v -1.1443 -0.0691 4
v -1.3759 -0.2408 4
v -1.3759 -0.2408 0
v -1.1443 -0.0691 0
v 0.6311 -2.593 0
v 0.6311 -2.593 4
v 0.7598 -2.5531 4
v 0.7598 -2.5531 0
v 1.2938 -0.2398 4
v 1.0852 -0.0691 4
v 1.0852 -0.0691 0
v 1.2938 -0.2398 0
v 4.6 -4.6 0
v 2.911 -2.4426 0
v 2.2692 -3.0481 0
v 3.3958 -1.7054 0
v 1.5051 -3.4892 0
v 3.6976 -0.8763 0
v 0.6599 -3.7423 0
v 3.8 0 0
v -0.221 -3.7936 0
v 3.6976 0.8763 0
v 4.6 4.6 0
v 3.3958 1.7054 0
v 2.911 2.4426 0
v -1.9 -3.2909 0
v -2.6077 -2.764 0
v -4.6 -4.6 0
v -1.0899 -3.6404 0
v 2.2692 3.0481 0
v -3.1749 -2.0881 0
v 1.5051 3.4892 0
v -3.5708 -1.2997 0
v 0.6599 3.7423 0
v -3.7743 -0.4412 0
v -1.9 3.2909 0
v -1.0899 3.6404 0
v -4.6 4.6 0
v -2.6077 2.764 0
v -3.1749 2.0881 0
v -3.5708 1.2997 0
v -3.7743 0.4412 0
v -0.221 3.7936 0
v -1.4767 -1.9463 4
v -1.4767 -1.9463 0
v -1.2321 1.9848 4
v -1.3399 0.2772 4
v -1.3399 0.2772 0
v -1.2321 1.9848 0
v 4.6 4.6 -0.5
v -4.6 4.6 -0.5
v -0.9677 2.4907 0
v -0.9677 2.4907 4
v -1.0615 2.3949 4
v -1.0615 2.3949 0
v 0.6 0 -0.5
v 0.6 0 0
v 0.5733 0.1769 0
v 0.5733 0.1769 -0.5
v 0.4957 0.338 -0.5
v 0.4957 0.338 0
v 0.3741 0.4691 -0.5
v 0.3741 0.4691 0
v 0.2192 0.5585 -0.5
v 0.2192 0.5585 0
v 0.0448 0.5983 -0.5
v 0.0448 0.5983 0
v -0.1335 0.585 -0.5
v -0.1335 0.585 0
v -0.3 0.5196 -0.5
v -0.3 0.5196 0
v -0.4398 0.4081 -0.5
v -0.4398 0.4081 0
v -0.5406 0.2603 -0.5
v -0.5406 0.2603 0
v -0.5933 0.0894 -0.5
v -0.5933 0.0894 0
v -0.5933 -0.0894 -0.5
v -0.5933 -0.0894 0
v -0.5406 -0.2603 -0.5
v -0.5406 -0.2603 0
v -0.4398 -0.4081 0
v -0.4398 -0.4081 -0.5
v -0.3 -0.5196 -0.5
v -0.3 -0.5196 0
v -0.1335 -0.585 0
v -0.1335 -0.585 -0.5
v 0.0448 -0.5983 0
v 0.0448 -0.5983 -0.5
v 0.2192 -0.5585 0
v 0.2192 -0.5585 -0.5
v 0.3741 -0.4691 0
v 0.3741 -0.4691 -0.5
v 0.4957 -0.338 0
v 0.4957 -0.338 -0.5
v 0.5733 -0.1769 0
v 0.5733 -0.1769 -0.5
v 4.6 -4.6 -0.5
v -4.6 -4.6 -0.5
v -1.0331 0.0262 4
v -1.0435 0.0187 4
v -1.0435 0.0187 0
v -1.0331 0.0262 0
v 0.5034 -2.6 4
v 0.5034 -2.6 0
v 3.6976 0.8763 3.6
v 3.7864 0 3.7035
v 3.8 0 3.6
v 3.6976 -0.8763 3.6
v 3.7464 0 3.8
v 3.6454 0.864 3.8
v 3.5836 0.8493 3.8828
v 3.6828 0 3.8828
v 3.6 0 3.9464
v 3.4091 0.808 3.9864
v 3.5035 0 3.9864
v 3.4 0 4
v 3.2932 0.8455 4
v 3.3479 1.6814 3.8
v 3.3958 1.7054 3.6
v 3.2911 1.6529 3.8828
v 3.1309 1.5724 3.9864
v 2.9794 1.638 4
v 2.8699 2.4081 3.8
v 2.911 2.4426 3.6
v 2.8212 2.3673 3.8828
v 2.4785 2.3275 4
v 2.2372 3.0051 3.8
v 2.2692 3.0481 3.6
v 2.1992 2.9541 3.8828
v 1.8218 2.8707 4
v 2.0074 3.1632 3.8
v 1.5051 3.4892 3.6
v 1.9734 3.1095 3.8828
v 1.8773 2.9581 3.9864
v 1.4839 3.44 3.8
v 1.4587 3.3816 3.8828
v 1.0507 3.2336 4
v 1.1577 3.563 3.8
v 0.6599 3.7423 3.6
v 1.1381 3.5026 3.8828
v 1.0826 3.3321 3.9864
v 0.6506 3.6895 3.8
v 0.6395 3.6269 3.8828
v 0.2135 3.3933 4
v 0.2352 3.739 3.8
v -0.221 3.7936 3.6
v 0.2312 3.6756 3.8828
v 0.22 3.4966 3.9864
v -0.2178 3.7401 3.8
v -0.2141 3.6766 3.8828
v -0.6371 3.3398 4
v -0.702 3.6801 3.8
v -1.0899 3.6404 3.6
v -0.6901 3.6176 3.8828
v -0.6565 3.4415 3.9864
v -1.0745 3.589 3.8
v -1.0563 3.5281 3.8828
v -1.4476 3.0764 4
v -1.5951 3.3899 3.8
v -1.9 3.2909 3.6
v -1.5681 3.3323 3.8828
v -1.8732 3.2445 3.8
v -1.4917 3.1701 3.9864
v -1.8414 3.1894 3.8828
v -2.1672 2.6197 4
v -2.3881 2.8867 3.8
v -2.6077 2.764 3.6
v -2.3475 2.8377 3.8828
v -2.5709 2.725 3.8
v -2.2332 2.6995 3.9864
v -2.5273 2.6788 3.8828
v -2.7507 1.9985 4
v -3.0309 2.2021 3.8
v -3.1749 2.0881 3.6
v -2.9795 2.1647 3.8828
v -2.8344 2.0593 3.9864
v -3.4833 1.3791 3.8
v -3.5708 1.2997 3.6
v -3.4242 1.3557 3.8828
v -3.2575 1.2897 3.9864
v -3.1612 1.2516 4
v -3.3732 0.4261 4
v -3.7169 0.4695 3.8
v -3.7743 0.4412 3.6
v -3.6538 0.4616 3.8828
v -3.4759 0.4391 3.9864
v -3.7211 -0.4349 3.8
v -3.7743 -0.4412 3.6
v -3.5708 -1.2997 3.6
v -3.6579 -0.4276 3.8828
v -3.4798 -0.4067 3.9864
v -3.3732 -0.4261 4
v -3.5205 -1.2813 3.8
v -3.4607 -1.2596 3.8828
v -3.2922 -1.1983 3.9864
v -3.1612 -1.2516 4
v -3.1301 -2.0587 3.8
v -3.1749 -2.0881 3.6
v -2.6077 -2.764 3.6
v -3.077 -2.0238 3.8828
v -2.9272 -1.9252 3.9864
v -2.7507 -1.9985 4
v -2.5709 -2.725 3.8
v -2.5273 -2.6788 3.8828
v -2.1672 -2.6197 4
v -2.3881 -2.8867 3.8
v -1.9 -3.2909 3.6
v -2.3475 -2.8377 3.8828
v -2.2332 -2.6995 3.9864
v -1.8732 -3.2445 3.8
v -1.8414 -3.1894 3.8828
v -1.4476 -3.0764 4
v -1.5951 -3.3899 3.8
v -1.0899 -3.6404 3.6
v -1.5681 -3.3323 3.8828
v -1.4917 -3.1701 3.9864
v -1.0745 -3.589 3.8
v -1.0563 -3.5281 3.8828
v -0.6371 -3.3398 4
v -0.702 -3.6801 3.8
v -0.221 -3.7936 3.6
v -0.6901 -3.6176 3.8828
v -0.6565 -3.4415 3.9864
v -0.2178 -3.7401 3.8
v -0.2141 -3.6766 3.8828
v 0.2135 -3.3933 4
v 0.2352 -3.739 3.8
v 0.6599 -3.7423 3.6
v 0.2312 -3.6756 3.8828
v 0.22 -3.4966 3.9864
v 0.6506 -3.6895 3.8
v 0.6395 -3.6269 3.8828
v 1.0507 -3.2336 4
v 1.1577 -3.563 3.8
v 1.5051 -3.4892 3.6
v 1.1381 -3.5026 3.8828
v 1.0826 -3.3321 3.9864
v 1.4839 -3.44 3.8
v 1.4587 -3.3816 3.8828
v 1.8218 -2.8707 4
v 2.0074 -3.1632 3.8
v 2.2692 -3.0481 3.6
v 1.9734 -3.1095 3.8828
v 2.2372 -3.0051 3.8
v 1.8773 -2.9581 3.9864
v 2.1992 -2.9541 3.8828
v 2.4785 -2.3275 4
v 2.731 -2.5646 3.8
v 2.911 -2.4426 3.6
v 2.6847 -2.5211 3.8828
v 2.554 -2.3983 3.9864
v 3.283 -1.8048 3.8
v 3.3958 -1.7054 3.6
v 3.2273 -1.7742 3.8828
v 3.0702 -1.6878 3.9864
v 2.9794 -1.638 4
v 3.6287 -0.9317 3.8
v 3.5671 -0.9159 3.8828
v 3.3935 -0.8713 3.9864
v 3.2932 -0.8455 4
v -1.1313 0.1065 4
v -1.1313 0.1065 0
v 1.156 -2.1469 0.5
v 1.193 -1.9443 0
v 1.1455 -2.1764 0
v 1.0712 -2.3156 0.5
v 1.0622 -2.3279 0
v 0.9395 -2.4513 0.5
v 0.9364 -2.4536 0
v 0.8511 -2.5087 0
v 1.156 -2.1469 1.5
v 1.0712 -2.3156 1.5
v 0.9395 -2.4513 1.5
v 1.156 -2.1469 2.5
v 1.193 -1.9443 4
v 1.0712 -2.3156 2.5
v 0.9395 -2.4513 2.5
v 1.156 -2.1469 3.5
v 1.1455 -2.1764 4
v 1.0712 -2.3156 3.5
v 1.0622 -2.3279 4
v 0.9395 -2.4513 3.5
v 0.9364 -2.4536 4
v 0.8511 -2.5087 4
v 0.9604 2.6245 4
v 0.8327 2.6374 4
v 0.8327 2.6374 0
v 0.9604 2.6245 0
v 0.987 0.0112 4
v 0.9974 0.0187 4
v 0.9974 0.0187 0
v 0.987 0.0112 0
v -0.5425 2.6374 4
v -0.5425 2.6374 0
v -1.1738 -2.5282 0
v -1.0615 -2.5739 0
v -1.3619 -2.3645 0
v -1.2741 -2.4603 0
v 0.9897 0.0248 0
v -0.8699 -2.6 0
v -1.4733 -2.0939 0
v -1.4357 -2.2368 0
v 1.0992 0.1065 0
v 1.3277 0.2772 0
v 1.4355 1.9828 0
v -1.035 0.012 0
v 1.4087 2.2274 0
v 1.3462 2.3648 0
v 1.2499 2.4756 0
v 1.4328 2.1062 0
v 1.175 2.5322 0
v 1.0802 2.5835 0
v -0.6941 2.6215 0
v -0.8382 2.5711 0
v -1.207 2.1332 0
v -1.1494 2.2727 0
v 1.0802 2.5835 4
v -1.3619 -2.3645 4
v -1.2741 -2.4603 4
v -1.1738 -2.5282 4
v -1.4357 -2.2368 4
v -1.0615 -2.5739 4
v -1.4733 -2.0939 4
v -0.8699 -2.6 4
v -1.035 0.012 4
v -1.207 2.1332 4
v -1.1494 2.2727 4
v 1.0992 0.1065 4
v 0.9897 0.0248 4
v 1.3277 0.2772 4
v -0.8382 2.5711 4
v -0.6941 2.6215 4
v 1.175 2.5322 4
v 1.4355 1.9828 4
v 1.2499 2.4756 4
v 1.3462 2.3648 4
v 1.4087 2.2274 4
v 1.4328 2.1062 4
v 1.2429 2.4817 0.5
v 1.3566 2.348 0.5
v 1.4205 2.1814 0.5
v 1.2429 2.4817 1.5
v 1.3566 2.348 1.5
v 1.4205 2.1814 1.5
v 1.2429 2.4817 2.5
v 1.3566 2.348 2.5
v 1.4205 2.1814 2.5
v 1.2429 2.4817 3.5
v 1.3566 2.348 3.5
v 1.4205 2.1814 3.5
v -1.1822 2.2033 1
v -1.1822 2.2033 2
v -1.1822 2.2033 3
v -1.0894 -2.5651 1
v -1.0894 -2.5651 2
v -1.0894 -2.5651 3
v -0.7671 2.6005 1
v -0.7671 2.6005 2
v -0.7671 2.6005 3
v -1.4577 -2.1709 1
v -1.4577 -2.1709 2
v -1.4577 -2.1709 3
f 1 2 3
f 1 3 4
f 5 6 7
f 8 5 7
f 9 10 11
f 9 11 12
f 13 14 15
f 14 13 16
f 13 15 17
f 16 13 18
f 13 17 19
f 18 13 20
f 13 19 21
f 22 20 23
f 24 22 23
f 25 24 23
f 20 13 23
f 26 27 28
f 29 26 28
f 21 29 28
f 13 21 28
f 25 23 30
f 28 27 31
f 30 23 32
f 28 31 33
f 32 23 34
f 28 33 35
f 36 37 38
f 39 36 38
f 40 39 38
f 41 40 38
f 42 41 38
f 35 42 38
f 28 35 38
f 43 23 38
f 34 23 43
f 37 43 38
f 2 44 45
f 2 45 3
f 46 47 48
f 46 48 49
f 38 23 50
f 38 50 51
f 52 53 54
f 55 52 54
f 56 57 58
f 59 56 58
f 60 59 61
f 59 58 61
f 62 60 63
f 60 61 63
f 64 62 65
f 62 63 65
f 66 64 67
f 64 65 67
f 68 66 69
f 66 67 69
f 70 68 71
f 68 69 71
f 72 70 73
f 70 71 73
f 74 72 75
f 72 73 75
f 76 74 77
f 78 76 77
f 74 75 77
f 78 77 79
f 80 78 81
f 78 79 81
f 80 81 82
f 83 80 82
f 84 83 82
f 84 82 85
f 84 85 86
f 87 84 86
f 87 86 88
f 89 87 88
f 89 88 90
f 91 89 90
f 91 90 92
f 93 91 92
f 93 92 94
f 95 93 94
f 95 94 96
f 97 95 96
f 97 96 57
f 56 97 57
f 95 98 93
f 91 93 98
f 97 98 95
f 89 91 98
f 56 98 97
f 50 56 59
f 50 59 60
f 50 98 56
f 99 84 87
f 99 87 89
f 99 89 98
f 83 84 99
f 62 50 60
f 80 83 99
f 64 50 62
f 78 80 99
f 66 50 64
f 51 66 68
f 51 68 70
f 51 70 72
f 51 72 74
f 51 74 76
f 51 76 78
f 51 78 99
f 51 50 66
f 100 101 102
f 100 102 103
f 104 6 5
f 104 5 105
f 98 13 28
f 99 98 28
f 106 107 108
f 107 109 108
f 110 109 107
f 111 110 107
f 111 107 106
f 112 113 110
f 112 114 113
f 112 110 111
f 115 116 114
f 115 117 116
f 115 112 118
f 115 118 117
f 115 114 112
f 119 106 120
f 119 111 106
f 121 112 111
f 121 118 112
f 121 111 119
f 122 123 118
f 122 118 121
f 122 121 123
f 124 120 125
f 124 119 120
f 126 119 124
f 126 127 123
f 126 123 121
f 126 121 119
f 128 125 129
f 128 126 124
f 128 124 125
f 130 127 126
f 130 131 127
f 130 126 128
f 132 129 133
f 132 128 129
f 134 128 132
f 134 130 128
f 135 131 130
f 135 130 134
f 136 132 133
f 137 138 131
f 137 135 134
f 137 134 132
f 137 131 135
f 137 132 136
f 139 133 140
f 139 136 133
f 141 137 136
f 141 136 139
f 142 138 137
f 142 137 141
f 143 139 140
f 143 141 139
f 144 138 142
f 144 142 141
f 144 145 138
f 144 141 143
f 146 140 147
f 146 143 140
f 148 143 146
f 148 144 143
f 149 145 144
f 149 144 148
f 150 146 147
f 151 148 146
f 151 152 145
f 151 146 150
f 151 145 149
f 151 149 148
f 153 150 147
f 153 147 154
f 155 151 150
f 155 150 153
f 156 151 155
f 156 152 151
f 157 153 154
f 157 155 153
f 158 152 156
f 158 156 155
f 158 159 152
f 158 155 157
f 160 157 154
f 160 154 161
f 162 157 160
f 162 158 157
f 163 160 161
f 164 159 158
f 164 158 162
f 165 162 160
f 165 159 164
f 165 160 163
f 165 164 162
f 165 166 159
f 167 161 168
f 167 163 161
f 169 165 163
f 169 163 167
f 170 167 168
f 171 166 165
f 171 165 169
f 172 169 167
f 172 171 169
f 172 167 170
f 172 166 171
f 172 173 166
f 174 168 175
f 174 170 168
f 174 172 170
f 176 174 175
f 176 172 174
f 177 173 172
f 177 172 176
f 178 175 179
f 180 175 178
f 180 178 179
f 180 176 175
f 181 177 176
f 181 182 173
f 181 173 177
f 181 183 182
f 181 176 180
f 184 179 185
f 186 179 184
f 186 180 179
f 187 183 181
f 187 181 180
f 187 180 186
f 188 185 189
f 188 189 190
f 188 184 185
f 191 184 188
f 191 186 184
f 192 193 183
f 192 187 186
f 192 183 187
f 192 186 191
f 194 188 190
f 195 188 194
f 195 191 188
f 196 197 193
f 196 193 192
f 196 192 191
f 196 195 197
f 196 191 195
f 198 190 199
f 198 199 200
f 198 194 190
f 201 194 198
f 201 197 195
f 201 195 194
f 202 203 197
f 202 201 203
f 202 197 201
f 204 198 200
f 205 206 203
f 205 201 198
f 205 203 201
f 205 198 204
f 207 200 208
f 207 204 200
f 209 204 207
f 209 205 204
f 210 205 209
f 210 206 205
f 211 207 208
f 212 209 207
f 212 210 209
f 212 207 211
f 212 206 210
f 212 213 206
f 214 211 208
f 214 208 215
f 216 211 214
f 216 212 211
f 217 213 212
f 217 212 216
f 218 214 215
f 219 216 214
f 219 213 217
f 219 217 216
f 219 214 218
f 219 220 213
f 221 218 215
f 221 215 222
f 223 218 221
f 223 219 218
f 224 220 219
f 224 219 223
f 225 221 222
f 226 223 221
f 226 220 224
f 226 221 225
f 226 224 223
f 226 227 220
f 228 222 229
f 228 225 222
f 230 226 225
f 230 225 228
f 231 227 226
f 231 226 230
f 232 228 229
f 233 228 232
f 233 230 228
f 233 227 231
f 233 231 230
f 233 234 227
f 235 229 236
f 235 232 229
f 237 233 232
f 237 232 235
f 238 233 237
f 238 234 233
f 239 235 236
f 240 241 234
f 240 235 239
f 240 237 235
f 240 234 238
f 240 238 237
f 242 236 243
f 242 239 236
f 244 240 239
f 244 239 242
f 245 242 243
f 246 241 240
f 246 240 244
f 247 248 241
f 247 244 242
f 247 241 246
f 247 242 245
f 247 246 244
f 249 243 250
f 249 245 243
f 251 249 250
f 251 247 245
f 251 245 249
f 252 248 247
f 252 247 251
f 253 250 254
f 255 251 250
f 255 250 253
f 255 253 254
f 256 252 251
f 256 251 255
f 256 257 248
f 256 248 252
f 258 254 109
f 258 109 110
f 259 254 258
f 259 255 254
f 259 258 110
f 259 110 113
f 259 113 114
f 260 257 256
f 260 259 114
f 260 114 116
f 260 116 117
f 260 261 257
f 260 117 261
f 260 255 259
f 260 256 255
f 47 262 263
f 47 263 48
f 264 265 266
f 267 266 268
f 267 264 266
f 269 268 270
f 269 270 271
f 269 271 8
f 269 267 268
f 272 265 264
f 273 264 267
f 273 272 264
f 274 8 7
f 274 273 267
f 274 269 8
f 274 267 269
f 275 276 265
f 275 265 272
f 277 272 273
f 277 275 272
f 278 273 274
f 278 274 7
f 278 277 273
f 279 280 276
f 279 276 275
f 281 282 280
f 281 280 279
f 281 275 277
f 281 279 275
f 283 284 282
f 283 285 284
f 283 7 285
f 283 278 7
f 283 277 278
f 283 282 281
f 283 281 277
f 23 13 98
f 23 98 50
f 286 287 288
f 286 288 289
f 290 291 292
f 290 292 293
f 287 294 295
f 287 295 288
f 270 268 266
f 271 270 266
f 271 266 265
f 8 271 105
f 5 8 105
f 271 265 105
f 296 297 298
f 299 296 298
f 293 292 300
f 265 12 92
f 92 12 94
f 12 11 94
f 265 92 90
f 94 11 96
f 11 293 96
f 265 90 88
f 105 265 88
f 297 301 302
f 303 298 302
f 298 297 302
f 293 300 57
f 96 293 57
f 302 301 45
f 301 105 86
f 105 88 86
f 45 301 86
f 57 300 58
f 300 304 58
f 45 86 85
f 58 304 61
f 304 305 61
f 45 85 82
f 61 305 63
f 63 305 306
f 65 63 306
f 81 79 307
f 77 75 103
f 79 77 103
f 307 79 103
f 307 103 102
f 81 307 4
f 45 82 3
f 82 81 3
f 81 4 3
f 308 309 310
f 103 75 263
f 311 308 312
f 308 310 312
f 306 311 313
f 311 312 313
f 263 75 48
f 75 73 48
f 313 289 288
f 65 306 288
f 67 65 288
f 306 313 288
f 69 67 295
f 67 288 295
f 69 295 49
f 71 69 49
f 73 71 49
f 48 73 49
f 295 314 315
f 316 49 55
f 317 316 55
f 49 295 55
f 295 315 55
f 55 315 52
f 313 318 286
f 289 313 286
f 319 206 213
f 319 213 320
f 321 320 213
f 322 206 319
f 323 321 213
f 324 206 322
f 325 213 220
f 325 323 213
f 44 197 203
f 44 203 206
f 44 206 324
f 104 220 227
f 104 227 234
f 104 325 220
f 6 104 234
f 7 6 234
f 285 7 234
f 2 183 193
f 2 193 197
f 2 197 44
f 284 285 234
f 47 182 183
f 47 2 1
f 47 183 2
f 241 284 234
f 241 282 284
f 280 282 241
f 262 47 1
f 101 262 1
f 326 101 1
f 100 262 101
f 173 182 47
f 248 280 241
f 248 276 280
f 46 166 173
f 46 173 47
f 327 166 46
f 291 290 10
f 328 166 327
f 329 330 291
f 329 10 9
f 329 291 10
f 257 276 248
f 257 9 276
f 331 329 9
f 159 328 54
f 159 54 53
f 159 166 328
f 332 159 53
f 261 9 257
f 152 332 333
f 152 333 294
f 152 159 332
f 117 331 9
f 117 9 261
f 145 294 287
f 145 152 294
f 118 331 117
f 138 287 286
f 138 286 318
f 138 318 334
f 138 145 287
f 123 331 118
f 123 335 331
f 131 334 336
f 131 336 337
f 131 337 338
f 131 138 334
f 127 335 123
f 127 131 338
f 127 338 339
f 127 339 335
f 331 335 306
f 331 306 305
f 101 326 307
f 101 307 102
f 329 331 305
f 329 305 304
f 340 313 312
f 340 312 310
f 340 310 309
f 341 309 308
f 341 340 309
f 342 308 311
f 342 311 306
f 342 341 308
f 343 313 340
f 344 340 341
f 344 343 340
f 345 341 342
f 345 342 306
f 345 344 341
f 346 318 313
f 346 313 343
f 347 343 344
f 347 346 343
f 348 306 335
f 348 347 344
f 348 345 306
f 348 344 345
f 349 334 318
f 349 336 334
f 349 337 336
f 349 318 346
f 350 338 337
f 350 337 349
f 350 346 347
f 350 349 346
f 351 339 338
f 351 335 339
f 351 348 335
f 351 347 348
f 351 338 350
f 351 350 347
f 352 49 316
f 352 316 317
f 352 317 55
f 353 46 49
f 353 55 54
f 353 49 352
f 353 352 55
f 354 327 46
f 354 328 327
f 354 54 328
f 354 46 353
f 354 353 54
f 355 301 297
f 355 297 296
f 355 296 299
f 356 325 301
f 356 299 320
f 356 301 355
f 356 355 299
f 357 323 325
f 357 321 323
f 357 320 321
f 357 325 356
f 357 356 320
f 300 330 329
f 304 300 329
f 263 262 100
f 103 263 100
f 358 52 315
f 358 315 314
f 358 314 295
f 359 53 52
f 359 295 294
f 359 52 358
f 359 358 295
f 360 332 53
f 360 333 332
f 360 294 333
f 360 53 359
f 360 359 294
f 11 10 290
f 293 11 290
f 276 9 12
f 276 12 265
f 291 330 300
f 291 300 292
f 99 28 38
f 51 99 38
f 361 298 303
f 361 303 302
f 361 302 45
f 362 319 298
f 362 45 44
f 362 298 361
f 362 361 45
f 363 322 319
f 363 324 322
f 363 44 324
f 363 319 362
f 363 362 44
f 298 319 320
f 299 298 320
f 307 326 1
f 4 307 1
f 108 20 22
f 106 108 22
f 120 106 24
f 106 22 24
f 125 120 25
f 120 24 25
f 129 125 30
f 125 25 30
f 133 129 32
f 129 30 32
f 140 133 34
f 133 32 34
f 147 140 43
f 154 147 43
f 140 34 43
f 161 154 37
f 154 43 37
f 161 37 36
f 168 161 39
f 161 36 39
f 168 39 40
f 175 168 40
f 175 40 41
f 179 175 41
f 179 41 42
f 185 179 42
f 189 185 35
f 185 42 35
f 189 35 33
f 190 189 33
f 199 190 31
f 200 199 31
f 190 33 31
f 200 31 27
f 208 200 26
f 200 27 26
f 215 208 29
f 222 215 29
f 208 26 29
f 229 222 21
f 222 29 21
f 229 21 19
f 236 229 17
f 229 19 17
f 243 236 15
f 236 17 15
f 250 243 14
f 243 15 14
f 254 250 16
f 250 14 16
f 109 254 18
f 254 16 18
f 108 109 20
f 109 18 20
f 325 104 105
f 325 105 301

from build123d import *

# Parameters (mm, degrees)
SKETCH_1_R          = 3.8
EXTRUDE_1_DEPTH     = 4
SKETCH_2_W          = 9.2
SKETCH_2_H          = 9.2
EXTRUDE_2_DEPTH     = 0.5
FILLET_1_R          = 0.4
CUT_EXTRUDE_1_DEPTH = 4
CUT_EXTRUDE_2_DEPTH = 4
SKETCH_6_R          = 0.6
CUT_EXTRUDE_3_DEPTH = 8.636753289


with BuildPart() as part:
    # Эскиз1 → Бобышка-Вытянуть1 (new body)
    with BuildSketch(Plane.XY):
        Circle(SKETCH_1_R)
    extrude(amount=EXTRUDE_1_DEPTH)

    # Эскиз2 → Бобышка-Вытянуть2 (add)
    with BuildSketch(Plane(origin=(0, 0, 0), x_dir=(-1, 0, 0), z_dir=(0, 0, -1))):
        Rectangle(SKETCH_2_W, SKETCH_2_H)
    extrude(amount=EXTRUDE_2_DEPTH)

    # Скругление1
    fillet_1_edges = [part.edges().sort_by_distance(p)[0] for p in [
        (-3.8, 0, 4),
    ]]
    fillet(fillet_1_edges, radius=FILLET_1_R)

    # Эскиз3 → Вырез-Вытянуть1 (cut)
    with BuildSketch(Plane.XY.offset(4)):
        with BuildLine():
            Line((0.690974718, 1.998722557), (-0.494633441, 1.998722557))
            Line((-0.494633441, 1.998722557), (-0.967679121, 2.490729983))
            add(Edge.make_bspline(
                [(-0.967679121, 2.490729983), (-0.935743796, 2.513158419), (-0.873030504, 2.557202469), (-0.767844988, 2.603328706), (-0.657245689, 2.632663902), (-0.580977928, 2.635835465), (-0.542536801, 2.637434023)],
                knots=[0, 0, 0, 0, 1.020658978, 2.004328627, 2.994124718, 4, 4, 4, 4], degree=3))
            Line((-0.542536801, 2.637434023), (0.832688825, 2.637434023))
            Line((0.832688825, 2.637434023), (0.960431118, 2.624460196))
            Line((0.960431118, 2.624460196), (0.690974718, 1.998722557))
        make_face()
        with BuildLine():
            Line((0.783787478, 1.88096013), (1.080189518, 2.583542743))
            add(Edge.make_bspline(
                [(1.080189518, 2.583542743), (1.109972559, 2.568779947), (1.167520755, 2.540254577), (1.243334529, 2.484258604), (1.307175652, 2.420878144), (1.358952297, 2.349302652), (1.397359267, 2.268743846), (1.422764532, 2.180418501), (1.437519643, 2.084041158), (1.436172967, 2.017402915), (1.435472771, 1.98275477)],
                knots=[0, 0, 0, 0, 1.065948377, 2.059675685, 3.011626956, 3.94566096, 4.882319089, 5.862745984, 6.888747923, 8, 8, 8, 8], degree=3))
            Line((1.435472771, 1.98275477), (1.327690211, 0.277195558))
            Line((1.327690211, 0.277195558), (1.099151265, 0.106539838))
            Line((1.099151265, 0.106539838), (0.689976732, 0.433879465))
            Line((0.689976732, 0.433879465), (0.783787478, 1.88096013))
        make_face()
        with BuildLine():
            Line((0.639079412, -0.397443428), (1.085179451, -0.069105815))
            Line((1.085179451, -0.069105815), (1.293758665, -0.239761535))
            Line((1.293758665, -0.239761535), (1.192962011, -1.94432276))
            add(Edge.make_bspline(
                [(1.192962011, -1.94432276), (1.189491314, -1.97970738), (1.182773161, -2.048200607), (1.158848827, -2.146611673), (1.121568365, -2.235816828), (1.073168163, -2.317130934), (1.012395956, -2.389697225), (0.939872486, -2.454028672), (0.854949528, -2.509516087), (0.79219465, -2.538268676), (0.759835798, -2.553094627)],
                knots=[0, 0, 0, 0, 1.076355317, 2.083477241, 3.054916997, 3.995219207, 4.939832775, 5.910749548, 6.922701339, 8, 8, 8, 8], degree=3))
            Line((0.759835798, -2.553094627), (0.544270678, -1.848516041))
            Line((0.544270678, -1.848516041), (0.639079412, -0.397443428))
        make_face()
        with BuildLine():
            Line((-0.742134134, -1.961288534), (0.442476038, -1.961288534))
            Line((0.442476038, -1.961288534), (0.631095518, -2.593014093))
            Line((0.631095518, -2.593014093), (0.503353225, -2.6))
            Line((0.503353225, -2.6), (-0.869876427, -2.6))
            add(Edge.make_bspline(
                [(-0.869876427, -2.6), (-0.907959732, -2.598286355), (-0.982390401, -2.594937176), (-1.089588752, -2.568328401), (-1.188525215, -2.524510079), (-1.245499134, -2.481728782), (-1.274061027, -2.460281867)],
                knots=[0, 0, 0, 0, 1.046522757, 2.045342129, 3.020100256, 4, 4, 4, 4], degree=3))
            Line((-1.274061027, -2.460281867), (-0.742134134, -1.961288534))
        make_face()
        with BuildLine():
            Line((-0.827960987, -1.857497921), (-1.361883854, -2.364475147))
            add(Edge.make_bspline(
                [(-1.361883854, -2.364475147), (-1.382559986, -2.334279014), (-1.423593096, -2.274352853), (-1.460868358, -2.170727201), (-1.480865064, -2.060535537), (-1.47807852, -1.984986172), (-1.47665232, -1.946318734)],
                knots=[0, 0, 0, 0, 0.987067533, 1.958898816, 2.955330013, 4, 4, 4, 4], degree=3))
            Line((-1.47665232, -1.946318734), (-1.375855667, -0.240759522))
            Line((-1.375855667, -0.240759522), (-1.14432276, -0.069105815))
            Line((-1.14432276, -0.069105815), (-0.733152254, -0.398441415))
            Line((-0.733152254, -0.398441415), (-0.827960987, -1.857497921))
        make_face()
        with BuildLine():
            Line((-0.684250907, 0.434877451), (-1.131348934, 0.106539838))
            Line((-1.131348934, 0.106539838), (-1.339928147, 0.277195558))
            Line((-1.339928147, 0.277195558), (-1.232145587, 1.984750744))
            add(Edge.make_bspline(
                [(-1.232145587, 1.984750744), (-1.228217454, 2.022627769), (-1.220457829, 2.097449969), (-1.184381891, 2.204509013), (-1.134468518, 2.306511141), (-1.086053255, 2.365165228), (-1.061489867, 2.394923263)],
                knots=[0, 0, 0, 0, 1.007070456, 1.989364909, 2.979908279, 4, 4, 4, 4], degree=3))
            Line((-1.061489867, 2.394923263), (-0.590440161, 1.888944024))
            Line((-0.590440161, 1.888944024), (-0.684250907, 0.434877451))
        make_face()
        Polygon((-1.043526107, 0.018717012), (-0.598424054, 0.338072745), (0.593172025, 0.338072745), (0.997356625, 0.018717012), (0.553252558, -0.300638722), (-0.639341507, -0.300638722), align=None)
    extrude(amount=-CUT_EXTRUDE_1_DEPTH, mode=Mode.SUBTRACT)

    # Эскиз5 → Вырез-Вытянуть2 (cut)
    with BuildSketch(Plane.XY.offset(4)):
        with BuildLine():
            Line((1.080189518, 2.583542743), (0.960431118, 2.624460196))
            Line((0.960431118, 2.624460196), (0.832688825, 2.637434023))
            Line((0.832688825, 2.637434023), (-0.542536801, 2.637434023))
            add(Edge.make_bspline(
                [(-0.967679121, 2.490729983), (-0.935743796, 2.513158419), (-0.873030504, 2.557202469), (-0.767844988, 2.603328706), (-0.657245689, 2.632663902), (-0.580977928, 2.635835465), (-0.542536801, 2.637434023)],
                knots=[0, 0, 0, 0, 0.255164744, 0.501082157, 0.74853118, 1, 1, 1, 1], degree=3))
            Line((-0.967679121, 2.490729983), (-1.061489867, 2.394923263))
            add(Edge.make_bspline(
                [(-1.232145587, 1.984750744), (-1.228217454, 2.022627769), (-1.220457829, 2.097449969), (-1.184381891, 2.204509013), (-1.134468518, 2.306511141), (-1.086053255, 2.365165228), (-1.061489867, 2.394923263)],
                knots=[0, 0, 0, 0, 0.251767614, 0.497341227, 0.74497707, 1, 1, 1, 1], degree=3))
            Line((-1.232145587, 1.984750744), (-1.339928147, 0.277195558))
            Line((-1.339928147, 0.277195558), (-1.131348934, 0.106539838))
            Line((-1.131348934, 0.106539838), (-1.024891339, 0.01943817))
            Line((-1.024891339, 0.01943817), (-1.14432276, -0.069105815))
            Line((-1.14432276, -0.069105815), (-1.375855667, -0.240759522))
            Line((-1.375855667, -0.240759522), (-1.47665232, -1.946318734))
            add(Edge.make_bspline(
                [(-1.361883854, -2.364475147), (-1.382559986, -2.334279014), (-1.423593096, -2.274352853), (-1.460868358, -2.170727201), (-1.480865064, -2.060535537), (-1.47807852, -1.984986172), (-1.47665232, -1.946318734)],
                knots=[0, 0, 0, 0, 0.246766883, 0.489724704, 0.738832503, 1, 1, 1, 1], degree=3))
            Line((-1.361883854, -2.364475147), (-1.274061027, -2.460281867))
            add(Edge.make_bspline(
                [(-0.869876427, -2.6), (-0.907959732, -2.598286355), (-0.982390401, -2.594937176), (-1.089588752, -2.568328401), (-1.188525215, -2.524510079), (-1.245499134, -2.481728782), (-1.274061027, -2.460281867)],
                knots=[0, 0, 0, 0, 0.261630689, 0.511335532, 0.755025064, 1, 1, 1, 1], degree=3))
            Line((-0.869876427, -2.6), (0.503353225, -2.6))
            Line((0.503353225, -2.6), (0.631095518, -2.593014093))
            Line((0.631095518, -2.593014093), (0.759835798, -2.553094627))
            add(Edge.make_bspline(
                [(1.192962011, -1.94432276), (1.189491314, -1.97970738), (1.182773161, -2.048200607), (1.158848827, -2.146611673), (1.121568365, -2.235816828), (1.073168163, -2.317130934), (1.012395956, -2.389697225), (0.939872486, -2.454028672), (0.854949528, -2.509516087), (0.79219465, -2.538268676), (0.759835798, -2.553094627)],
                knots=[0, 0, 0, 0, 0.134544415, 0.260434655, 0.381864625, 0.499402401, 0.617479097, 0.738843694, 0.865337667, 1, 1, 1, 1], degree=3))
            Line((1.192962011, -1.94432276), (1.293758665, -0.239761535))
            Line((1.293758665, -0.239761535), (1.085179451, -0.069105815))
            Line((1.085179451, -0.069105815), (0.979606032, 0.017272437))
            Line((0.979606032, 0.017272437), (1.099151265, 0.106539838))
            Line((1.099151265, 0.106539838), (1.327690211, 0.277195558))
            Line((1.327690211, 0.277195558), (1.435472771, 1.98275477))
            add(Edge.make_bspline(
                [(1.080189518, 2.583542743), (1.109972559, 2.568779947), (1.167520755, 2.540254577), (1.243334529, 2.484258604), (1.307175652, 2.420878144), (1.358952297, 2.349302652), (1.397359267, 2.268743846), (1.422764532, 2.180418501), (1.437519643, 2.084041158), (1.436172967, 2.017402915), (1.435472771, 1.98275477)],
                knots=[0, 0, 0, 0, 0.133243547, 0.257459461, 0.376453369, 0.49320762, 0.610289886, 0.732843248, 0.86109349, 1, 1, 1, 1], degree=3))
        make_face()
    extrude(amount=-CUT_EXTRUDE_2_DEPTH, mode=Mode.SUBTRACT)

    # Эскиз6 → Вырез-Вытянуть3 (cut, through all)
    with BuildSketch(Plane.XY):
        Circle(SKETCH_6_R)
    extrude(amount=-CUT_EXTRUDE_3_DEPTH, mode=Mode.SUBTRACT)


solid = part.part
